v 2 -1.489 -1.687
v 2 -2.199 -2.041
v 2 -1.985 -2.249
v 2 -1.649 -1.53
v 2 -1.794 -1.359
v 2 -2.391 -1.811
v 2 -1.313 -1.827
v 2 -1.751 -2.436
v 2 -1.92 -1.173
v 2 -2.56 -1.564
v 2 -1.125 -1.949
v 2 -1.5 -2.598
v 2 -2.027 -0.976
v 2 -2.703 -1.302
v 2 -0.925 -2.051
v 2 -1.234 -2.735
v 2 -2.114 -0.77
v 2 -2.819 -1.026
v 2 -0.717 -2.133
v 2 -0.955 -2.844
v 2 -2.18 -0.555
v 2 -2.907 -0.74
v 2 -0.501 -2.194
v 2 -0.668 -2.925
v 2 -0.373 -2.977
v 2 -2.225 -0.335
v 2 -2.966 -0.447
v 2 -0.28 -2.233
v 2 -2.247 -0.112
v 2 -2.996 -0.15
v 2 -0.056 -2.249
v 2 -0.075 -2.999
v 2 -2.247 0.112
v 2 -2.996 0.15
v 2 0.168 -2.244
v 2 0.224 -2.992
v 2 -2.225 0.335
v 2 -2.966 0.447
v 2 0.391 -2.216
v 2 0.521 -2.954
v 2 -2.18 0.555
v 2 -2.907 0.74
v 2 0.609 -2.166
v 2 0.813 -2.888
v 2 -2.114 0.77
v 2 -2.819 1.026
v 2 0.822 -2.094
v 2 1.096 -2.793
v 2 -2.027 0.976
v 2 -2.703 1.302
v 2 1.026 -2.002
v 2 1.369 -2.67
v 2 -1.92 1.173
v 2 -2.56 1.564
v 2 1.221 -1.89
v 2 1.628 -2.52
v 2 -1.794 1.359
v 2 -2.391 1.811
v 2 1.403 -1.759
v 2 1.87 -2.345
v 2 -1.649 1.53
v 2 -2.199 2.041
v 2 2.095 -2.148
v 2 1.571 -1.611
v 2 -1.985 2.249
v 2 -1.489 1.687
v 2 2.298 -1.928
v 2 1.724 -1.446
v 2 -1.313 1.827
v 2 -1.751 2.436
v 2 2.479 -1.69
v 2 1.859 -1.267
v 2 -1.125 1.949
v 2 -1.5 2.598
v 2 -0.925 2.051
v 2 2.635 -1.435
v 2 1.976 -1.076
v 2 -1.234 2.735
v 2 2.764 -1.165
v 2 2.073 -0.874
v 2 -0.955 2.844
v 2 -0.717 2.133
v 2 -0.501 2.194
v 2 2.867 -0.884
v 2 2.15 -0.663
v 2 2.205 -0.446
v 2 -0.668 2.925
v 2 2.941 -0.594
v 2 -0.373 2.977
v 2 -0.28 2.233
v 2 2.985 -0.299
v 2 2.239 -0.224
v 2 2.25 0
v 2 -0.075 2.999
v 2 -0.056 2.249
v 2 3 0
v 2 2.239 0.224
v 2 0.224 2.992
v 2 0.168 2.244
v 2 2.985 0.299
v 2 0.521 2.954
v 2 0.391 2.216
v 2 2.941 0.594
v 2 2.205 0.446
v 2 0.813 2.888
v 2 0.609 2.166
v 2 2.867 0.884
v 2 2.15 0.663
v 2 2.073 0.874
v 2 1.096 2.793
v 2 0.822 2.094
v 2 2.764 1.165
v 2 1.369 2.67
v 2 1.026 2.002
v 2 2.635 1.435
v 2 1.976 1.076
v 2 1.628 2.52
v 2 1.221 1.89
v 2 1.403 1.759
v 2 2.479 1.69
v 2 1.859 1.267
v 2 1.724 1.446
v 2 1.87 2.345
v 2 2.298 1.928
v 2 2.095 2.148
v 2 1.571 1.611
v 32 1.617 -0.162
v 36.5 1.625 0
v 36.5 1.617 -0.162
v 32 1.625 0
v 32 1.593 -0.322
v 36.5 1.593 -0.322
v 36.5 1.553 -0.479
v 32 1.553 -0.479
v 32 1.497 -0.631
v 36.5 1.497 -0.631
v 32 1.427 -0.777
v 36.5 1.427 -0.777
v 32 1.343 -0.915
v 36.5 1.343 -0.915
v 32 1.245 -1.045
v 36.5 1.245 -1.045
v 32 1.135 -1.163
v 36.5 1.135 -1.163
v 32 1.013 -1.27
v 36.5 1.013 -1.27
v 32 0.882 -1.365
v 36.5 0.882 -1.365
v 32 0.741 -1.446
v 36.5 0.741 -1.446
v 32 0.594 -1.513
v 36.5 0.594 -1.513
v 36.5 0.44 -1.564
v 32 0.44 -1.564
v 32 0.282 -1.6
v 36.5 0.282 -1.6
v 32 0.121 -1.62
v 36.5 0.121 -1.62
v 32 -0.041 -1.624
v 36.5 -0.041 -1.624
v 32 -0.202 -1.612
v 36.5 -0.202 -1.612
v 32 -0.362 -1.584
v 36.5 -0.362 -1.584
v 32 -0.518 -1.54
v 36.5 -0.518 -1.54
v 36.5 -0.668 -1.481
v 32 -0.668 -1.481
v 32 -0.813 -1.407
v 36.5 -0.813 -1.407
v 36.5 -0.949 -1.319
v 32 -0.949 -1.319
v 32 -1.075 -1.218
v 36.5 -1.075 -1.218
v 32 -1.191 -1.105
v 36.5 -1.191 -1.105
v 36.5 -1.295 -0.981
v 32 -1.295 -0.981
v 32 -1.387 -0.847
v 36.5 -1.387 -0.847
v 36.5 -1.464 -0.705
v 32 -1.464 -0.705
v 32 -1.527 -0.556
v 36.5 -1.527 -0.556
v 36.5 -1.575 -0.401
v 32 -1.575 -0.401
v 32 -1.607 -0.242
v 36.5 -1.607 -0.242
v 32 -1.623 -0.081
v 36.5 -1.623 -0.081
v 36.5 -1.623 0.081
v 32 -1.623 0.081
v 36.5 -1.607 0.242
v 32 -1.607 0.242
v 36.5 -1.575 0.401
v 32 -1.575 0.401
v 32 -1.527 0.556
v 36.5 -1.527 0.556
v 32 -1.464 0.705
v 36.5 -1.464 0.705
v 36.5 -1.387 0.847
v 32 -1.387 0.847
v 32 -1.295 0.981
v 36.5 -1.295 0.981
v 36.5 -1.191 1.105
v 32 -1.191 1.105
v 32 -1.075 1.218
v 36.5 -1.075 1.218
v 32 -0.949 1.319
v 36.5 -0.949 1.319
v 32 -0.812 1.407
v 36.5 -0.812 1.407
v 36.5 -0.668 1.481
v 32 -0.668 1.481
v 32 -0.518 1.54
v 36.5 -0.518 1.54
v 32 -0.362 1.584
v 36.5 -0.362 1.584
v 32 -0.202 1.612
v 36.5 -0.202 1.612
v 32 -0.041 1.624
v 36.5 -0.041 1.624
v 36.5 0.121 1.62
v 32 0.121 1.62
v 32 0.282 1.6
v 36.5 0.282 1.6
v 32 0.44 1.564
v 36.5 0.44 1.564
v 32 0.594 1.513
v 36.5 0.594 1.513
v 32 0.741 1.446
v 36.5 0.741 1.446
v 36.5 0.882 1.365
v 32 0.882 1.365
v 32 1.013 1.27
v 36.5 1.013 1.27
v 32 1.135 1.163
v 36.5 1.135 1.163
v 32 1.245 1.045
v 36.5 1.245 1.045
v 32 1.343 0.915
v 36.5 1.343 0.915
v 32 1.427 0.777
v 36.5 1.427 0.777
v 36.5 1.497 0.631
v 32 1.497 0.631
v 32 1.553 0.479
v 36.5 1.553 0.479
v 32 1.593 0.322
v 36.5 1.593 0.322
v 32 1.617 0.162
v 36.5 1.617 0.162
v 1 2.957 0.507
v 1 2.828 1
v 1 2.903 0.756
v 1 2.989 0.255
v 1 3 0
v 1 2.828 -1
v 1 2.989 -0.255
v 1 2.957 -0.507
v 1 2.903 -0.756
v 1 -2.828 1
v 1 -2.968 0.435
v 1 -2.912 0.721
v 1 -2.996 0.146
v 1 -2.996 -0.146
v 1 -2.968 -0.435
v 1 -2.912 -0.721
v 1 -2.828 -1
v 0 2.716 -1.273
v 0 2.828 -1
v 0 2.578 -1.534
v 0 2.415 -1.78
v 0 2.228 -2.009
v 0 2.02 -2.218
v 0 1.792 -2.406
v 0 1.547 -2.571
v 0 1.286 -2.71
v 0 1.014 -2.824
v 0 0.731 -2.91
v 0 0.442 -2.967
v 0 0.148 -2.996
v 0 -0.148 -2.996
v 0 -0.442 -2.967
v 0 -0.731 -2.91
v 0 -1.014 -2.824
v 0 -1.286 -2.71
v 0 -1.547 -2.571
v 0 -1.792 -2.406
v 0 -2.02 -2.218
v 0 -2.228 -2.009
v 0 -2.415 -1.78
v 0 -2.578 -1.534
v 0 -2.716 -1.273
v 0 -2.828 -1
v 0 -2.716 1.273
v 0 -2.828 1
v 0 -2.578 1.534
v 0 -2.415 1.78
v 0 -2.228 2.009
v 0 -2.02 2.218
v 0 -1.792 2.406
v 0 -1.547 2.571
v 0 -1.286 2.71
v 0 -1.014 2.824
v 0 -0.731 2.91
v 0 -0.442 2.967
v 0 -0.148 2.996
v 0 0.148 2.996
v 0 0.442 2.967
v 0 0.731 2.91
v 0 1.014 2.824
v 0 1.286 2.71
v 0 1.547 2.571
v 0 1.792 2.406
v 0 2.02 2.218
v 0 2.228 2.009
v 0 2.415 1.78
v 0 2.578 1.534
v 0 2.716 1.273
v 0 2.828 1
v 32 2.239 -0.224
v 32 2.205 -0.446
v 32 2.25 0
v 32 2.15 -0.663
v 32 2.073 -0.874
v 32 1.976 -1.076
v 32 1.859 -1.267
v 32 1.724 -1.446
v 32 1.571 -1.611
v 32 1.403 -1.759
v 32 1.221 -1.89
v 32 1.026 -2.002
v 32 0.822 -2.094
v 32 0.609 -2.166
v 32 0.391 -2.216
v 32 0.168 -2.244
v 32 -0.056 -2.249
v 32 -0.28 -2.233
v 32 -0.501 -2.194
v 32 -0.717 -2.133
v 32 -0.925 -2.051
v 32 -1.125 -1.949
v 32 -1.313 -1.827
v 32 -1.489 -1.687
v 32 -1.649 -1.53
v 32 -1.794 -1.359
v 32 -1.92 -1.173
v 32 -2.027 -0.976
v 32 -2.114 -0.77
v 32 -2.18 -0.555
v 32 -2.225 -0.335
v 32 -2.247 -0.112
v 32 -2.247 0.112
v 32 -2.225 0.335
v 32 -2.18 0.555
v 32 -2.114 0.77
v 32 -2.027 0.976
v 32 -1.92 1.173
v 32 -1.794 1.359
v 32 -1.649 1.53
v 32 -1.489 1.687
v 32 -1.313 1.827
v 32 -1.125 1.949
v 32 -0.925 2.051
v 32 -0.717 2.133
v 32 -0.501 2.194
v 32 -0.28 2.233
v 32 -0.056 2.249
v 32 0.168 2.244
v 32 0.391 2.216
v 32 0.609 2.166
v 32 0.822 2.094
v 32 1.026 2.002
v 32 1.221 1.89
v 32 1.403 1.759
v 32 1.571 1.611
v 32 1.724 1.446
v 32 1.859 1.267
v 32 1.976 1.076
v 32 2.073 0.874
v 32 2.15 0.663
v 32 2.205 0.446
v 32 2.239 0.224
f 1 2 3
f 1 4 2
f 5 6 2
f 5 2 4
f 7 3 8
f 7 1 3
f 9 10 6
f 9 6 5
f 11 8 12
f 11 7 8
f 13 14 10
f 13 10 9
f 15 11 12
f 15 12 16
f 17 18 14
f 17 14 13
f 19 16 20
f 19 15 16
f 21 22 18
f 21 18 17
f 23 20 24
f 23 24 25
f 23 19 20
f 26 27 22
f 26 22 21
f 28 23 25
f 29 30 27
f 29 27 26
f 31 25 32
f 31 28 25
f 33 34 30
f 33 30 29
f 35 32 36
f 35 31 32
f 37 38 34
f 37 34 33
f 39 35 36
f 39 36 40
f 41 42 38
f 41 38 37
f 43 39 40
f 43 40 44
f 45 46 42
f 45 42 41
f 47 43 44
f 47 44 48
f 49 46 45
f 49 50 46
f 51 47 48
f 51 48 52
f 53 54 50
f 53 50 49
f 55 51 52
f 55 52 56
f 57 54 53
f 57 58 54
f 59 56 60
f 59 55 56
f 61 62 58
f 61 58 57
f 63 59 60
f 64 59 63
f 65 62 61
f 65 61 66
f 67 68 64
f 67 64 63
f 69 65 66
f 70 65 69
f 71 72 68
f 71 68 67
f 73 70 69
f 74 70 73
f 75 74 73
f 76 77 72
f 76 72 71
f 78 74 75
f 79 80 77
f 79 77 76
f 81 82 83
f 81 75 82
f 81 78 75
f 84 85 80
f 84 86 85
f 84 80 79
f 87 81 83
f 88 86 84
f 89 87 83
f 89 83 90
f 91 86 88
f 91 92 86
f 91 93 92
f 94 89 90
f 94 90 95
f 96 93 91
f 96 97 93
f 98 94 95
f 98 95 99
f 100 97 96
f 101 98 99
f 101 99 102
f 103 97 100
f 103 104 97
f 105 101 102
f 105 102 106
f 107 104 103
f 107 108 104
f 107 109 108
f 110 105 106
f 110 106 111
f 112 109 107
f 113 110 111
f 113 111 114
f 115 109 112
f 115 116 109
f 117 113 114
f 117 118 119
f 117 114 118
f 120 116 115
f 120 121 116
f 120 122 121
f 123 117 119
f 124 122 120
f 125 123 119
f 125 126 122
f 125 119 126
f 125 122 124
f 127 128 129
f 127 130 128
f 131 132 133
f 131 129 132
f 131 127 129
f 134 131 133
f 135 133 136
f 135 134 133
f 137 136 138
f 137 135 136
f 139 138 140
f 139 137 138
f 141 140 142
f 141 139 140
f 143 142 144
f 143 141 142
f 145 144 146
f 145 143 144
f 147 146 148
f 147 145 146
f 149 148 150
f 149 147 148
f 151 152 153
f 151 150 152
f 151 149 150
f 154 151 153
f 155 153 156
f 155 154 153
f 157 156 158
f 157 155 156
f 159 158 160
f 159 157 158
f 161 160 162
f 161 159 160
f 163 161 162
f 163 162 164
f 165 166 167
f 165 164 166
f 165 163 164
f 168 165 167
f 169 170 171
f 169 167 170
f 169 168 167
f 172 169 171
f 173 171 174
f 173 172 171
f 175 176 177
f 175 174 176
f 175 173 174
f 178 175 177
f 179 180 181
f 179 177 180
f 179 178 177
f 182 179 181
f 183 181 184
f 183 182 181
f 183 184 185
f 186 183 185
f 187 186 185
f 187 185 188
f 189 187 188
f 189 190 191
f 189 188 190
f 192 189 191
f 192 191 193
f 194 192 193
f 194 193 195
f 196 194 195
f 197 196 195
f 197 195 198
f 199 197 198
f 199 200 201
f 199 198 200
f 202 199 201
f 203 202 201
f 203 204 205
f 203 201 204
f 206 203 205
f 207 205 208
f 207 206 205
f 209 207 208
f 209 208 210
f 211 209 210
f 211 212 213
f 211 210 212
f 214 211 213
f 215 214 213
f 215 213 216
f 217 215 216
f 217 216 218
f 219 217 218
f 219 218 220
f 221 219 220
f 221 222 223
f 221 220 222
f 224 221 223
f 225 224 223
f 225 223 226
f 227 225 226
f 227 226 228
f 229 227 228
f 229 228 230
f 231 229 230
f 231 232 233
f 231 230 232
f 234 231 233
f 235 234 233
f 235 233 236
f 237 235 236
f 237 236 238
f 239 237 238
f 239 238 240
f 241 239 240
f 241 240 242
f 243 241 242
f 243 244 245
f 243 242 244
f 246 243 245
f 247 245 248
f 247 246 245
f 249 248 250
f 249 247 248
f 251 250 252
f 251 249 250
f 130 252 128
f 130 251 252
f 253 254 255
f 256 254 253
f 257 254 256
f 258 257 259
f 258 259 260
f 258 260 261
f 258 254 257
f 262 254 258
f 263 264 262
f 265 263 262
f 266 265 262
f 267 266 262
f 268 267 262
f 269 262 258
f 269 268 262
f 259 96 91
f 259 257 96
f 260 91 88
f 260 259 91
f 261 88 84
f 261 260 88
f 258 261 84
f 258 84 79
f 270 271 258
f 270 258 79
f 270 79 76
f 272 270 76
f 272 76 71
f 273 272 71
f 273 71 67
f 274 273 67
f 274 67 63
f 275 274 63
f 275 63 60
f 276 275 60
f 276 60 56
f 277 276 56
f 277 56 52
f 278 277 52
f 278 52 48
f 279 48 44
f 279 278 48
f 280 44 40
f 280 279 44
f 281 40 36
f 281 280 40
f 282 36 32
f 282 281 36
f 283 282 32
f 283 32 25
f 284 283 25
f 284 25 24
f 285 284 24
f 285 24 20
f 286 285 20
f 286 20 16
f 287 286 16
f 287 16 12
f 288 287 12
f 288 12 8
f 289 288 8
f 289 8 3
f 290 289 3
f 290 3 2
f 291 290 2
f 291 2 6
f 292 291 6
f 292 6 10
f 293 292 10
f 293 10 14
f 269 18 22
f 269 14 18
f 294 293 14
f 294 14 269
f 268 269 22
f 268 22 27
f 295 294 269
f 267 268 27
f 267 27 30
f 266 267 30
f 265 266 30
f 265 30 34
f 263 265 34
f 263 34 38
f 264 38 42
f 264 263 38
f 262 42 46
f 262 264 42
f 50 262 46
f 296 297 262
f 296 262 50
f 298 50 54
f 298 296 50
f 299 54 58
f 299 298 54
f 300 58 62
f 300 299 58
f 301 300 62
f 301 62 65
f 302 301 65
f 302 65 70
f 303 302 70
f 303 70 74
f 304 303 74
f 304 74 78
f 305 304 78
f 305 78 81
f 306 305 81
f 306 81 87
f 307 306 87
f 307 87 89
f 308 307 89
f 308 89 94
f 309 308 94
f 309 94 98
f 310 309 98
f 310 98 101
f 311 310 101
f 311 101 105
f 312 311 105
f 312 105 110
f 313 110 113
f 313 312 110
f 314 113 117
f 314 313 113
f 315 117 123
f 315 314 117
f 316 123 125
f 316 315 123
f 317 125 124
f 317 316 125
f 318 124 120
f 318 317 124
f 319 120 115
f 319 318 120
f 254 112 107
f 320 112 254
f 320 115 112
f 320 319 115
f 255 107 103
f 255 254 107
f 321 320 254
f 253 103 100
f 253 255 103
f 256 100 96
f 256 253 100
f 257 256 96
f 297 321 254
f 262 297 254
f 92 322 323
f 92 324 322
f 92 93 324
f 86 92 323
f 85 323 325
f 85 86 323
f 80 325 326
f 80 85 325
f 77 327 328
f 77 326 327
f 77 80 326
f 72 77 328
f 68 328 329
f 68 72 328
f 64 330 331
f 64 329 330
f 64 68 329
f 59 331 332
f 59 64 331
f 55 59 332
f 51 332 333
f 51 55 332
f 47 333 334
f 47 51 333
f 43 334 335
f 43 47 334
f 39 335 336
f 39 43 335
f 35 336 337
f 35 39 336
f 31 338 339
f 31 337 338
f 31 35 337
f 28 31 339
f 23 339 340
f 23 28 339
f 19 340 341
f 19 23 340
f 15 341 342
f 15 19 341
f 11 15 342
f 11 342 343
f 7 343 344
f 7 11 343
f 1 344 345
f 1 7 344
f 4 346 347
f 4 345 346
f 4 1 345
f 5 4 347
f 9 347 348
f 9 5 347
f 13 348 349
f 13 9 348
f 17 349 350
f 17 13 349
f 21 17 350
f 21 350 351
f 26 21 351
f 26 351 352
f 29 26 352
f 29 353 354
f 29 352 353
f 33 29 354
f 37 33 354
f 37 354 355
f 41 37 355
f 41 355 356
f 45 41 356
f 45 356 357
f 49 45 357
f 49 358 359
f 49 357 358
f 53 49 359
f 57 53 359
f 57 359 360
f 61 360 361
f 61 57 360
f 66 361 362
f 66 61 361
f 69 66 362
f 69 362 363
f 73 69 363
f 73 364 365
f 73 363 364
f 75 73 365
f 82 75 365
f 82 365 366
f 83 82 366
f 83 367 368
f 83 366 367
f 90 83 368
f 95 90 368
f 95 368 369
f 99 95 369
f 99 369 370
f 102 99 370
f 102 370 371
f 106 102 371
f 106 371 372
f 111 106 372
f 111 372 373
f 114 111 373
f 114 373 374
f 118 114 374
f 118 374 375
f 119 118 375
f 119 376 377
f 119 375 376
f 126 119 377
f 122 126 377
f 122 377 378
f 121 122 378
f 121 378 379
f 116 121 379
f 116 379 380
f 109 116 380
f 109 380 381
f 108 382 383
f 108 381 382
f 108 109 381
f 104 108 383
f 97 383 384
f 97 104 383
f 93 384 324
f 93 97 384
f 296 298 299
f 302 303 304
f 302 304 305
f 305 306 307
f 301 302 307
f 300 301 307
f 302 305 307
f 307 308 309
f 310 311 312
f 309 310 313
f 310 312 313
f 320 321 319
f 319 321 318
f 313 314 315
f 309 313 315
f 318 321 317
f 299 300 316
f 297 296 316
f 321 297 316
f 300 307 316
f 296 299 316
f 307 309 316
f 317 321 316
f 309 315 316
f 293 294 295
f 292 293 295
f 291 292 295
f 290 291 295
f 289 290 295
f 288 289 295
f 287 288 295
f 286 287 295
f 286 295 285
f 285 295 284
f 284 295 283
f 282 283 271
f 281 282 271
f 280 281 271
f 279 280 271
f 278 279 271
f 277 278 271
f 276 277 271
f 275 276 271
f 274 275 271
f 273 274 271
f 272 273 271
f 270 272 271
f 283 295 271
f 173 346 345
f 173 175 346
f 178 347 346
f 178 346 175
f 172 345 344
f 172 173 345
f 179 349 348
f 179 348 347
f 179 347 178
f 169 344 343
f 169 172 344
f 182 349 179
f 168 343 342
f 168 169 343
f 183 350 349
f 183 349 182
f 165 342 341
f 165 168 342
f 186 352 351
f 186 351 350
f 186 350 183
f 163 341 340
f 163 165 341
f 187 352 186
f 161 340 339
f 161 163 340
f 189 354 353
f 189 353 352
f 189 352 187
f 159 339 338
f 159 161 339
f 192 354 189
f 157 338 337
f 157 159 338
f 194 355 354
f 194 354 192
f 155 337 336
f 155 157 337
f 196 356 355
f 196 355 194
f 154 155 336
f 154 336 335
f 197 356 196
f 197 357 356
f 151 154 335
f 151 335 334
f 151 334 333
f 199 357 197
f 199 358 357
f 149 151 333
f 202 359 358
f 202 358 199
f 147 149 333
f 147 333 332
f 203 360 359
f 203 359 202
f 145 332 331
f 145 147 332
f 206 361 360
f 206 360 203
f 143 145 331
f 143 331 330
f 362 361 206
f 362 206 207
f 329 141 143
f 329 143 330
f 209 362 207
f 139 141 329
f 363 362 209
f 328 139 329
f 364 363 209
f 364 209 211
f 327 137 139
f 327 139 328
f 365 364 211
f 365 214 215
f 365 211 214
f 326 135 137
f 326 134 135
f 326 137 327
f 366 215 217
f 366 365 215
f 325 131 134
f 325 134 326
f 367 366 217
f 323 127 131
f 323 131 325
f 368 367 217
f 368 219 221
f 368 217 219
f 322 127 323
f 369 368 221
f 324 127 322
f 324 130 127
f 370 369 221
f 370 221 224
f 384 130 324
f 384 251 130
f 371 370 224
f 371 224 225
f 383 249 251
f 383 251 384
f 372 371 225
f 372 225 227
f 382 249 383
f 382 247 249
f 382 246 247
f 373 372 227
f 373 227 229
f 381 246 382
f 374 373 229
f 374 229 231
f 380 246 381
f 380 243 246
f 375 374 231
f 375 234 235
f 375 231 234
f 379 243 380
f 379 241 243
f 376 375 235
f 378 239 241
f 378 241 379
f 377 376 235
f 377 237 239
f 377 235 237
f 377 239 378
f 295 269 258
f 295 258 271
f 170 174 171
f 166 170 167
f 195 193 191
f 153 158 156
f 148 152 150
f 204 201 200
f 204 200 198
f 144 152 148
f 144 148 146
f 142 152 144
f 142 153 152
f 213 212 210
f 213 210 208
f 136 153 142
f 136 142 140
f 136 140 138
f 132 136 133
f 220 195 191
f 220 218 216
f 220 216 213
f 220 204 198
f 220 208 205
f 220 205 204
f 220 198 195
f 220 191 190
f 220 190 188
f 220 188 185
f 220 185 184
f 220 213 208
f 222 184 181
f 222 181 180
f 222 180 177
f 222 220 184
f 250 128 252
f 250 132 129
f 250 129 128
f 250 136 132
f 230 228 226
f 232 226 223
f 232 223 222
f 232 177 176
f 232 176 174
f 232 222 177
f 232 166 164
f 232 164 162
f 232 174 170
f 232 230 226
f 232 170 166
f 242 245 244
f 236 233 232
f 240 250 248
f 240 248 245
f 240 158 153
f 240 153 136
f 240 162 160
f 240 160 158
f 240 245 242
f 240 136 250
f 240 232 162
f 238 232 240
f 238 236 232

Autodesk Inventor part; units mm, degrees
ref_plane "YZ Plane" through (0, 0, 0) normal (1, 0, 0) x (0, 1, 0)
ref_plane "XZ Plane" through (0, 0, 0) normal (0, 1, 0) x (-1, 0, 0)
ref_plane "XY Plane" through (0, 0, 0) normal (0, 0, 1) x (1, 0, 0)
sketch "Sketch1" plane through (0, 0, 0) normal (0, 0, 1) x (1, 0, 0)
  line L0 (0, 0) -> (2, 0)
  line L1 (2, 0) -> (2, 3)
  line L2 (2, 3) -> (0, 3)
  line L3 (0, 3) -> (0, 0)
  line L4 (2, 0) -> (32, 0)
  line L5 (32, 0) -> (32, 2.25)
  line L6 (32, 2.25) -> (2, 2.25)
  line L7 (2, 2.25) -> (2, 0)
  line L8 (32, 0) -> (36.5, 0)
  line L9 (36.5, 0) -> (36.5, 1.625)
  line L10 (36.5, 1.625) -> (32, 1.625)
  line L11 (32, 1.625) -> (32, 0)
  dimension "d0" = 36.5
  dimension "d1" = 32
  dimension "d2" = 2
  dimension "d3" = 6
  dimension "d4" = 4.5
  dimension "d5" = 3.25
revolve "Revolution1" add sketch "Sketch1" angle 360 about axis through (2, 0, 0) along (1, 0, 0)
sketch "Sketch2" plane through (0, 0, 0) normal (0, 1, 0) x (-1, 0, 0)
  line L0 (0, 3) -> (0, -3) projected
  line L1 (-2, 3) -> (-2, -3) projected
  line L2 (0, 1) -> (-1, 1)
  line L3 (-1, 1) -> (-1, -1)
  line L4 (-1, -1) -> (0, -1)
  line L5 (0, -1) -> (0, 1)
  dimension "d10" = 2
  dimension "d11" = 2
  dimension "d12" = 2
  dimension "d15" = 1
extrude "Extrusion1" cut sketch "Sketch2" along normal mid plane 10
thread "Thread1" size "M3.5x0.6" class "6g" standard "ANSI Metric M Profile" full length
equation "\"d11\" = d12"
properties part number "406-02" material "Steel, Mild"
